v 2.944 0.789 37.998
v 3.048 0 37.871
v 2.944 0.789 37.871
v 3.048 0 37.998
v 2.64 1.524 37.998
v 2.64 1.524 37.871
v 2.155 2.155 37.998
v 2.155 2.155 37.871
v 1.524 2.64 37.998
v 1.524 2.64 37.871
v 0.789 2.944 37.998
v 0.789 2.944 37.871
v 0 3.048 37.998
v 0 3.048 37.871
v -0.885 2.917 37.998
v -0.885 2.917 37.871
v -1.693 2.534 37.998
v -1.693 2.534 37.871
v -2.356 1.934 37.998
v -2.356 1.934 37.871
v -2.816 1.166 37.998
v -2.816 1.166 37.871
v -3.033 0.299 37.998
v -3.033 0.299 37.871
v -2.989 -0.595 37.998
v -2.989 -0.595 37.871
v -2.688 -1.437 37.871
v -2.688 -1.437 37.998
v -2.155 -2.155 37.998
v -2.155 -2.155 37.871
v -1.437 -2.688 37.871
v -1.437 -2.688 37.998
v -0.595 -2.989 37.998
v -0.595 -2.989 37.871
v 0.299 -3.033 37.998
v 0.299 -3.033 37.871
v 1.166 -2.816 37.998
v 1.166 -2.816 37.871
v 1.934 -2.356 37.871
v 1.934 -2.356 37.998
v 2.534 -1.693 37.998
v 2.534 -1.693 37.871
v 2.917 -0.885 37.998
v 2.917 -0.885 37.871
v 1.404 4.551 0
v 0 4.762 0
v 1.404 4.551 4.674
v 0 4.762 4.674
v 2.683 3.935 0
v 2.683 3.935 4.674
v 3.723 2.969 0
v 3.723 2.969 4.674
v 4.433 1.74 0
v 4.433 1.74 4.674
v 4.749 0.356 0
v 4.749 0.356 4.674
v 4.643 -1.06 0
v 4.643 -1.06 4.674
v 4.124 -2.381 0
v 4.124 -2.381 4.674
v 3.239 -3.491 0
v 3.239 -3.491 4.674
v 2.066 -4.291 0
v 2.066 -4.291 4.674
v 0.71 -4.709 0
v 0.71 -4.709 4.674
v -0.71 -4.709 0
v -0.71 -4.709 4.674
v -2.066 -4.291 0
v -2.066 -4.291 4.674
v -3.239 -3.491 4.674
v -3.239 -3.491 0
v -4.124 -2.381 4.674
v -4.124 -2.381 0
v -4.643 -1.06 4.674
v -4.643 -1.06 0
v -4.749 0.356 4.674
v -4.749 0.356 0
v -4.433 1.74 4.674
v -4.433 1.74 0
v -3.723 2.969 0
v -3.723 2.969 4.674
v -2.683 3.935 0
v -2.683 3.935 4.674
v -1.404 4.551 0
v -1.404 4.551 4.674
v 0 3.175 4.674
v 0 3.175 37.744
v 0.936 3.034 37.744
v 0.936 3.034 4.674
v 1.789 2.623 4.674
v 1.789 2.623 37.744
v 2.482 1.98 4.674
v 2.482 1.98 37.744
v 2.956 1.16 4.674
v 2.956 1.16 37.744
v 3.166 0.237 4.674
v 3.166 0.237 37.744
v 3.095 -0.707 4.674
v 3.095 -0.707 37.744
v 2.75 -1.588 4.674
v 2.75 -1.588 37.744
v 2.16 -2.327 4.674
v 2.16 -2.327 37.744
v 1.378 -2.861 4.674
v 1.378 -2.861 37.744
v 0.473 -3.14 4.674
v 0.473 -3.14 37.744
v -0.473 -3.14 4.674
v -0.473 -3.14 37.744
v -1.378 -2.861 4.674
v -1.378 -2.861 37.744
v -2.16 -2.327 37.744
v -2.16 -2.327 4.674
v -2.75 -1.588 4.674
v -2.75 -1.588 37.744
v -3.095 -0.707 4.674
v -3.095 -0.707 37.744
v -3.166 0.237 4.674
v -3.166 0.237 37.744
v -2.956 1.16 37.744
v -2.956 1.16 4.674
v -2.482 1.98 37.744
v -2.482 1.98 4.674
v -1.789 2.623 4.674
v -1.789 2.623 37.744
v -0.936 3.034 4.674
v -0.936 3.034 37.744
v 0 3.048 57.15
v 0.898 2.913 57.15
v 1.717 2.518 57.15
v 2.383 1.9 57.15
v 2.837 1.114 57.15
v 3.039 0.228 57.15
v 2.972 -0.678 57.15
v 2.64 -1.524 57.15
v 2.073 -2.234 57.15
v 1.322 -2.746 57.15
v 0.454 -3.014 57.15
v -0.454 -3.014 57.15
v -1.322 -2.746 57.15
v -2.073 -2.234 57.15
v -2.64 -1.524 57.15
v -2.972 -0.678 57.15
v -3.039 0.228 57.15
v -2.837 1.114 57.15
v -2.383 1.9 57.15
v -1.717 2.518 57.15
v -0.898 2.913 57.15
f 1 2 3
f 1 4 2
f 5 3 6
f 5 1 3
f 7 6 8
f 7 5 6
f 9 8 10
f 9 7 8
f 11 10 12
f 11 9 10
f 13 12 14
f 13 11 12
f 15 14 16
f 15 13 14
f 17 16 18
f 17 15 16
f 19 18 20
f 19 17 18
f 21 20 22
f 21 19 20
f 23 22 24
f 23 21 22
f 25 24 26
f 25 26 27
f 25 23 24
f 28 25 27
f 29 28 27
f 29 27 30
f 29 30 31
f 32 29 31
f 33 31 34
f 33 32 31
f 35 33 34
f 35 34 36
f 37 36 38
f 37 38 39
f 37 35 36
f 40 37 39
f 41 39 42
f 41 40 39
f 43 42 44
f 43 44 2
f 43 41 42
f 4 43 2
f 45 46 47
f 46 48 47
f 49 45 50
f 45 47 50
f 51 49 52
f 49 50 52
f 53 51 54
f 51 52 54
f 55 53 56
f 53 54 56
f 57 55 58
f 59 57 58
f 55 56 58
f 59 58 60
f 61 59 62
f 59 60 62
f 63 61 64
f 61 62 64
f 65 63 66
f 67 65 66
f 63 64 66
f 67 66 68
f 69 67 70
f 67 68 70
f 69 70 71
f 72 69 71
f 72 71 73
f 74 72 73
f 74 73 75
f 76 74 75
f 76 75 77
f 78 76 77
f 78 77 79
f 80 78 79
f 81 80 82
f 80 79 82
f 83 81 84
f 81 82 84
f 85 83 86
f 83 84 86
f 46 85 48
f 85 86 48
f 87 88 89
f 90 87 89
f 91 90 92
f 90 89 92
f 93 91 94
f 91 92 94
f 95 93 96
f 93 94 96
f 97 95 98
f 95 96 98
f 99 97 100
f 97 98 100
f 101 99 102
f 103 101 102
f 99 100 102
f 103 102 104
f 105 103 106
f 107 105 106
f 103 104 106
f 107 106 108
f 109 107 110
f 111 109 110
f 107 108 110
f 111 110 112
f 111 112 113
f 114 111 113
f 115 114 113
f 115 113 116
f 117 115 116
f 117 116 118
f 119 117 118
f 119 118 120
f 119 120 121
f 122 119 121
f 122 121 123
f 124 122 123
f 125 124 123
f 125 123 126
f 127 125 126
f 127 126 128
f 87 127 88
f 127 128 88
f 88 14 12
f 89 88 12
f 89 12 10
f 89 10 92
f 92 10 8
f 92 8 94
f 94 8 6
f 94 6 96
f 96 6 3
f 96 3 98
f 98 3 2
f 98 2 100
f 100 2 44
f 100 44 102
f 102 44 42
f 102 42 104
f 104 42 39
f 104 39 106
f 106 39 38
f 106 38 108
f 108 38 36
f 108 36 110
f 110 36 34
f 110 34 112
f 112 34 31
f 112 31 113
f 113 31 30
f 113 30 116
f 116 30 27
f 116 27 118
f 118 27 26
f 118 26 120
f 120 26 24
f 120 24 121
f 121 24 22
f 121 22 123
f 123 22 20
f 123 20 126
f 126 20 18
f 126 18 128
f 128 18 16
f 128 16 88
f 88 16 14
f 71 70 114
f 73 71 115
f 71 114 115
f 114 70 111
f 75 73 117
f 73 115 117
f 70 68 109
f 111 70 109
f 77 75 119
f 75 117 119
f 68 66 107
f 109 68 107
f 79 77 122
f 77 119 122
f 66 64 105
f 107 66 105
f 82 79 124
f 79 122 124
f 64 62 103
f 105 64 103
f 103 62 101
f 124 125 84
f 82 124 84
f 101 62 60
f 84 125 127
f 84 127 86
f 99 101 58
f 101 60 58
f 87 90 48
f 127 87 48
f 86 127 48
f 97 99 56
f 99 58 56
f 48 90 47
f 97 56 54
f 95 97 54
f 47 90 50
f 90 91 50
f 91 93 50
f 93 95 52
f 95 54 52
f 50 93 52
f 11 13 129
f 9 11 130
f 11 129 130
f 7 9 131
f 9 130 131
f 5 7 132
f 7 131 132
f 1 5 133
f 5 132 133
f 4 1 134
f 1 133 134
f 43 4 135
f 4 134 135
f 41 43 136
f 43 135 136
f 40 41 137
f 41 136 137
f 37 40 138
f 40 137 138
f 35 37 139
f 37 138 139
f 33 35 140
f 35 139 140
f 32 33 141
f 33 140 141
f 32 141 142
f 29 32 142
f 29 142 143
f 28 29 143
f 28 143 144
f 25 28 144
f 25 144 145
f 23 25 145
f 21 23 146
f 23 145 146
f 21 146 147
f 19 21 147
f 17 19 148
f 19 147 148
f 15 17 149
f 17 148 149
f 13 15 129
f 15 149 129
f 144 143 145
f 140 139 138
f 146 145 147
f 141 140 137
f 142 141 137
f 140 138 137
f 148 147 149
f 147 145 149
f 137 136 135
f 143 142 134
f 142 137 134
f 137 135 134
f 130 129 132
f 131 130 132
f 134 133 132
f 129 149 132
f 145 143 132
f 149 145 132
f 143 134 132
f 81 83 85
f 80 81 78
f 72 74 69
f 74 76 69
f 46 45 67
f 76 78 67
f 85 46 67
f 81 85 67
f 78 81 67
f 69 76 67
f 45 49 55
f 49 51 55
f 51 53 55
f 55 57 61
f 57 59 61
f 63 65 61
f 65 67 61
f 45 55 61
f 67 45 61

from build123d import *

# Parameters (mm, degrees)
F2_S5_R     = 3.048
F2_T6_DEPTH = 6


# Not quite as in the source:
# - a fillet or chamfer that OpenCascade refuses, or shapes differently, is made with other operations: its cross-section is extruded or revolved along the edge and cut away or added


with BuildPart() as f1:
    # F0 (on Right) → F1 (revolve)
    with BuildSketch(Plane.YZ):
        Polygon((0, 57.15), (0, 0), (4.7625, 0), (4.7625, 4.6736), (3.175, 4.6736), (3.175, 37.9984), (3.048, 37.9984), (3.048, 57.15), align=None)
    revolve(axis=Axis((0, 0, 28.575), (0, 0, -1)))

    # F2: chamfer of 0.254 on 1 edges, made by hand


with BuildPart() as f2_tool2:
    # F2_s3 → F2_t4 (revolve)
    with BuildSketch(Plane.YZ):
        Polygon((3.175, 37.7444), (2.921, 37.9984), (3.175, 37.9984), align=None)
    revolve(axis=Axis((0, 0, 37.9984), (0, 0, -1)))

    # F2_s5 → F2_t6 (cut, symmetric)
    with BuildSketch(Plane.XY.offset(37.9)):
        Circle(F2_S5_R)
    extrude(amount=F2_T6_DEPTH, both=True, mode=Mode.SUBTRACT)


with BuildPart() as f1_1:
    add(f1.part)

    # F2_t1: cut F2_tool2
    add(f2_tool2.part, mode=Mode.SUBTRACT)


solid = f1_1.part
